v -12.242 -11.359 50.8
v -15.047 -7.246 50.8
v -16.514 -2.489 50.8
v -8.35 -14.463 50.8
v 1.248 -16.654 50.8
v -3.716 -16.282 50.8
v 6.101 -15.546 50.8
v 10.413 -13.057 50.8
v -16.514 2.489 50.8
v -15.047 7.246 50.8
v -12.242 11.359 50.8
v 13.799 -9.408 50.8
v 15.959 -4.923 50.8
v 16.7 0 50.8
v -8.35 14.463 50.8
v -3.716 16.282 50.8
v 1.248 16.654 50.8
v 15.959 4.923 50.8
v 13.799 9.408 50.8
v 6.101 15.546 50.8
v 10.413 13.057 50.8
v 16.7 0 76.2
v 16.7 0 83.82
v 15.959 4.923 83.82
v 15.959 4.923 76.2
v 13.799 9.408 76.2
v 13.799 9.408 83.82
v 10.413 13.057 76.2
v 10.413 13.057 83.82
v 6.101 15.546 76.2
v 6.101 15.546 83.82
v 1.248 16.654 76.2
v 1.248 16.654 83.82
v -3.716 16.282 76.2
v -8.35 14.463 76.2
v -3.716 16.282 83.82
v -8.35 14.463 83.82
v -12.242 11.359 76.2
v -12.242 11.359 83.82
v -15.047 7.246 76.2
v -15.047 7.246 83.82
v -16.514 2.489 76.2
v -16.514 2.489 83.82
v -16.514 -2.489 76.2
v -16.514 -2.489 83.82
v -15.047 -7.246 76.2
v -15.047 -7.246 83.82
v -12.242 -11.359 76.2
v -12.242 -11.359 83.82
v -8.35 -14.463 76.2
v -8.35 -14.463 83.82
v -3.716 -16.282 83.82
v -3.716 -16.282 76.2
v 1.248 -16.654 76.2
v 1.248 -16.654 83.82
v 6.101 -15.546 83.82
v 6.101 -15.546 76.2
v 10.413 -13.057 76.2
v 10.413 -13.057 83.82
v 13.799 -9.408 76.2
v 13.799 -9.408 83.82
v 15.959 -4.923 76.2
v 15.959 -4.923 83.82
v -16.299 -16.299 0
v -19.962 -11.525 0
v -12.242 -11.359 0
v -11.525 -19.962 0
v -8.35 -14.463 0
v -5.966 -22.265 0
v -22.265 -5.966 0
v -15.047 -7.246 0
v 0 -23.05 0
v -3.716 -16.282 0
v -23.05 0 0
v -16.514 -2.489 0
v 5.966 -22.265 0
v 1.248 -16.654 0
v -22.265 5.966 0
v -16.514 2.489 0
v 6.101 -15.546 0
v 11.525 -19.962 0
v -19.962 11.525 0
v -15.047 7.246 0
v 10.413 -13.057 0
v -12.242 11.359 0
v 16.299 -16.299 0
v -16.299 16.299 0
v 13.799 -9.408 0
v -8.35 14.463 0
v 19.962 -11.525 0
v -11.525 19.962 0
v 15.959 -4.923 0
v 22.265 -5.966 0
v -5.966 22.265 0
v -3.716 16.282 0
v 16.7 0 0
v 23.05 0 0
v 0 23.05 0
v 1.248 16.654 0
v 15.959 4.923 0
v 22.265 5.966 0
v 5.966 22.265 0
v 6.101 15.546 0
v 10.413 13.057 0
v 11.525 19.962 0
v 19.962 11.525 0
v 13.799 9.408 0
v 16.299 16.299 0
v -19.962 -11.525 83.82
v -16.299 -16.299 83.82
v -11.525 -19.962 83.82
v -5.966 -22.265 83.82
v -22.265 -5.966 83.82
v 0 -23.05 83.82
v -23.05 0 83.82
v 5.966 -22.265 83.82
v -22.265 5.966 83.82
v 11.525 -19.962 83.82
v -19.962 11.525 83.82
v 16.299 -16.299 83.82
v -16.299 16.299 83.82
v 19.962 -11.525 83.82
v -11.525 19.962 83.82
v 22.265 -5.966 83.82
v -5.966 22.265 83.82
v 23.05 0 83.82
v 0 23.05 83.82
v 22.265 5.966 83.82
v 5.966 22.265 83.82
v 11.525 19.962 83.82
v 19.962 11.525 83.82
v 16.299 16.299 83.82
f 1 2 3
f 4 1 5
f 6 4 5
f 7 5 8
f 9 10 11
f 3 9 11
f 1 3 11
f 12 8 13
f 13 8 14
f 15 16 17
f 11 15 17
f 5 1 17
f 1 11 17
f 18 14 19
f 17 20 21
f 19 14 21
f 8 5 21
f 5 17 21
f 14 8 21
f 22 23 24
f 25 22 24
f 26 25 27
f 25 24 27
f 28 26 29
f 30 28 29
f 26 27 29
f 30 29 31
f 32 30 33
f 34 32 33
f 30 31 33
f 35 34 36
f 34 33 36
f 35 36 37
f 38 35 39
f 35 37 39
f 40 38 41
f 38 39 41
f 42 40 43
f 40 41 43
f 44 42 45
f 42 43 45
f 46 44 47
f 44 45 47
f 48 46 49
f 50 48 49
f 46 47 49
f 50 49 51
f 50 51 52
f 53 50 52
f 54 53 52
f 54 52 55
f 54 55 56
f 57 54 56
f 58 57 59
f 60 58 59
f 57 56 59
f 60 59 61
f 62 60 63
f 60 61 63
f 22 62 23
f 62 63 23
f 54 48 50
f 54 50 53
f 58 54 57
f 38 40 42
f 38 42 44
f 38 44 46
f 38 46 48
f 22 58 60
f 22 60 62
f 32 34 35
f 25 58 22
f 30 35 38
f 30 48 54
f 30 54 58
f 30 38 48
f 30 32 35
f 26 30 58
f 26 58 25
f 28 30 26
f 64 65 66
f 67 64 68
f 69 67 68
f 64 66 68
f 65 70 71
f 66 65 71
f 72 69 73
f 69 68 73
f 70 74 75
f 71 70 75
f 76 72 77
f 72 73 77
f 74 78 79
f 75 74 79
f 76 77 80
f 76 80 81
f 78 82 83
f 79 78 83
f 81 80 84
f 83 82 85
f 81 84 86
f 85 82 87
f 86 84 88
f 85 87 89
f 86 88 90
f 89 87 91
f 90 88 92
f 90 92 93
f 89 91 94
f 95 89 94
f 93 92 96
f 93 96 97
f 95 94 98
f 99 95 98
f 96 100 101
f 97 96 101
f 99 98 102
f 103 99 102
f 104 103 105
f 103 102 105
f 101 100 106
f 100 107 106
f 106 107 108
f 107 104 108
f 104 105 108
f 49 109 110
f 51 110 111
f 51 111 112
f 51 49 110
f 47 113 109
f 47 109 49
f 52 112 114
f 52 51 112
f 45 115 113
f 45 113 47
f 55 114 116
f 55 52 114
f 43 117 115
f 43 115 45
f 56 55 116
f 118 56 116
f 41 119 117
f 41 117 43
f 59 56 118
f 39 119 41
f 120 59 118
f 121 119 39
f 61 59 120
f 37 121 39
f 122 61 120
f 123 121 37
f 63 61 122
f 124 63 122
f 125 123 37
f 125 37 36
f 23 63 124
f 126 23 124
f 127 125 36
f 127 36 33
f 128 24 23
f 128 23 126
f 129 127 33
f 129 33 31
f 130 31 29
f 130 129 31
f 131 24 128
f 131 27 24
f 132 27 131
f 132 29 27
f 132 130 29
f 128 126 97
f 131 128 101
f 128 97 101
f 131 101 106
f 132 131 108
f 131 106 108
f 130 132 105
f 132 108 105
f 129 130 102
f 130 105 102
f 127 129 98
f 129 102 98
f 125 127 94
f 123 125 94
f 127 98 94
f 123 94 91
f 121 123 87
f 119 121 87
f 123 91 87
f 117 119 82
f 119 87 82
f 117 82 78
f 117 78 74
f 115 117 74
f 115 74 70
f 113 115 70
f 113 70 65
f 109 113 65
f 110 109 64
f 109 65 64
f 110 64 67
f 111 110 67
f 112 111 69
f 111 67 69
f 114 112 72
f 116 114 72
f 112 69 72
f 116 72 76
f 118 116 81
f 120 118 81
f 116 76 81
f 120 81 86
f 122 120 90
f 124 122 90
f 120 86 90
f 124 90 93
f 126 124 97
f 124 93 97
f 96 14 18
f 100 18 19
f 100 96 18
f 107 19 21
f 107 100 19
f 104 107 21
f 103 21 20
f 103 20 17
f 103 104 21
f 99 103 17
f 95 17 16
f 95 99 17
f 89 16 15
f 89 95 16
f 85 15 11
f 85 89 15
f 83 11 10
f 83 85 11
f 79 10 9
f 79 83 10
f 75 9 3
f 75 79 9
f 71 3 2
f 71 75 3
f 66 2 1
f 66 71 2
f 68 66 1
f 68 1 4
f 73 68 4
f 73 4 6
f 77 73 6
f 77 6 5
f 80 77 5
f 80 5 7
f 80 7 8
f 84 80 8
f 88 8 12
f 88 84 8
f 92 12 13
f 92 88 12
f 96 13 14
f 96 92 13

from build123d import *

# Parameters (mm, degrees)
F0_R      = 23.0505
F0_R_2    = 16.7005
F1_DEPTH  = 50.8
F2_R      = 23.0505
F3_DEPTH  = 25.4
F3_FACE_R = 23.0505
F4_DEPTH  = 7.62
F5_R      = 16.7005
F6_DEPTH  = 7.62


with BuildPart() as f1:
    # F0 (on Top) → F1 (new body)
    with BuildSketch(Plane.XY):
        Circle(F0_R)
        Circle(F0_R_2, mode=Mode.SUBTRACT)
    extrude(amount=F1_DEPTH)

    # F2 (on face) → F3 (join)
    with BuildSketch(Plane.XY.offset(50.8)):
        Circle(F2_R)
    extrude(amount=F3_DEPTH)

    # F3_face (on face) → F4 (join)
    with BuildSketch(Plane.XY.offset(76.2)):
        Circle(F3_FACE_R)
    extrude(amount=F4_DEPTH)

    # F5 (on face) → F6 (cut)
    with BuildSketch(Plane.XY.offset(83.82)):
        Circle(F5_R)
    extrude(amount=-F6_DEPTH, mode=Mode.SUBTRACT)


solid = f1.part
